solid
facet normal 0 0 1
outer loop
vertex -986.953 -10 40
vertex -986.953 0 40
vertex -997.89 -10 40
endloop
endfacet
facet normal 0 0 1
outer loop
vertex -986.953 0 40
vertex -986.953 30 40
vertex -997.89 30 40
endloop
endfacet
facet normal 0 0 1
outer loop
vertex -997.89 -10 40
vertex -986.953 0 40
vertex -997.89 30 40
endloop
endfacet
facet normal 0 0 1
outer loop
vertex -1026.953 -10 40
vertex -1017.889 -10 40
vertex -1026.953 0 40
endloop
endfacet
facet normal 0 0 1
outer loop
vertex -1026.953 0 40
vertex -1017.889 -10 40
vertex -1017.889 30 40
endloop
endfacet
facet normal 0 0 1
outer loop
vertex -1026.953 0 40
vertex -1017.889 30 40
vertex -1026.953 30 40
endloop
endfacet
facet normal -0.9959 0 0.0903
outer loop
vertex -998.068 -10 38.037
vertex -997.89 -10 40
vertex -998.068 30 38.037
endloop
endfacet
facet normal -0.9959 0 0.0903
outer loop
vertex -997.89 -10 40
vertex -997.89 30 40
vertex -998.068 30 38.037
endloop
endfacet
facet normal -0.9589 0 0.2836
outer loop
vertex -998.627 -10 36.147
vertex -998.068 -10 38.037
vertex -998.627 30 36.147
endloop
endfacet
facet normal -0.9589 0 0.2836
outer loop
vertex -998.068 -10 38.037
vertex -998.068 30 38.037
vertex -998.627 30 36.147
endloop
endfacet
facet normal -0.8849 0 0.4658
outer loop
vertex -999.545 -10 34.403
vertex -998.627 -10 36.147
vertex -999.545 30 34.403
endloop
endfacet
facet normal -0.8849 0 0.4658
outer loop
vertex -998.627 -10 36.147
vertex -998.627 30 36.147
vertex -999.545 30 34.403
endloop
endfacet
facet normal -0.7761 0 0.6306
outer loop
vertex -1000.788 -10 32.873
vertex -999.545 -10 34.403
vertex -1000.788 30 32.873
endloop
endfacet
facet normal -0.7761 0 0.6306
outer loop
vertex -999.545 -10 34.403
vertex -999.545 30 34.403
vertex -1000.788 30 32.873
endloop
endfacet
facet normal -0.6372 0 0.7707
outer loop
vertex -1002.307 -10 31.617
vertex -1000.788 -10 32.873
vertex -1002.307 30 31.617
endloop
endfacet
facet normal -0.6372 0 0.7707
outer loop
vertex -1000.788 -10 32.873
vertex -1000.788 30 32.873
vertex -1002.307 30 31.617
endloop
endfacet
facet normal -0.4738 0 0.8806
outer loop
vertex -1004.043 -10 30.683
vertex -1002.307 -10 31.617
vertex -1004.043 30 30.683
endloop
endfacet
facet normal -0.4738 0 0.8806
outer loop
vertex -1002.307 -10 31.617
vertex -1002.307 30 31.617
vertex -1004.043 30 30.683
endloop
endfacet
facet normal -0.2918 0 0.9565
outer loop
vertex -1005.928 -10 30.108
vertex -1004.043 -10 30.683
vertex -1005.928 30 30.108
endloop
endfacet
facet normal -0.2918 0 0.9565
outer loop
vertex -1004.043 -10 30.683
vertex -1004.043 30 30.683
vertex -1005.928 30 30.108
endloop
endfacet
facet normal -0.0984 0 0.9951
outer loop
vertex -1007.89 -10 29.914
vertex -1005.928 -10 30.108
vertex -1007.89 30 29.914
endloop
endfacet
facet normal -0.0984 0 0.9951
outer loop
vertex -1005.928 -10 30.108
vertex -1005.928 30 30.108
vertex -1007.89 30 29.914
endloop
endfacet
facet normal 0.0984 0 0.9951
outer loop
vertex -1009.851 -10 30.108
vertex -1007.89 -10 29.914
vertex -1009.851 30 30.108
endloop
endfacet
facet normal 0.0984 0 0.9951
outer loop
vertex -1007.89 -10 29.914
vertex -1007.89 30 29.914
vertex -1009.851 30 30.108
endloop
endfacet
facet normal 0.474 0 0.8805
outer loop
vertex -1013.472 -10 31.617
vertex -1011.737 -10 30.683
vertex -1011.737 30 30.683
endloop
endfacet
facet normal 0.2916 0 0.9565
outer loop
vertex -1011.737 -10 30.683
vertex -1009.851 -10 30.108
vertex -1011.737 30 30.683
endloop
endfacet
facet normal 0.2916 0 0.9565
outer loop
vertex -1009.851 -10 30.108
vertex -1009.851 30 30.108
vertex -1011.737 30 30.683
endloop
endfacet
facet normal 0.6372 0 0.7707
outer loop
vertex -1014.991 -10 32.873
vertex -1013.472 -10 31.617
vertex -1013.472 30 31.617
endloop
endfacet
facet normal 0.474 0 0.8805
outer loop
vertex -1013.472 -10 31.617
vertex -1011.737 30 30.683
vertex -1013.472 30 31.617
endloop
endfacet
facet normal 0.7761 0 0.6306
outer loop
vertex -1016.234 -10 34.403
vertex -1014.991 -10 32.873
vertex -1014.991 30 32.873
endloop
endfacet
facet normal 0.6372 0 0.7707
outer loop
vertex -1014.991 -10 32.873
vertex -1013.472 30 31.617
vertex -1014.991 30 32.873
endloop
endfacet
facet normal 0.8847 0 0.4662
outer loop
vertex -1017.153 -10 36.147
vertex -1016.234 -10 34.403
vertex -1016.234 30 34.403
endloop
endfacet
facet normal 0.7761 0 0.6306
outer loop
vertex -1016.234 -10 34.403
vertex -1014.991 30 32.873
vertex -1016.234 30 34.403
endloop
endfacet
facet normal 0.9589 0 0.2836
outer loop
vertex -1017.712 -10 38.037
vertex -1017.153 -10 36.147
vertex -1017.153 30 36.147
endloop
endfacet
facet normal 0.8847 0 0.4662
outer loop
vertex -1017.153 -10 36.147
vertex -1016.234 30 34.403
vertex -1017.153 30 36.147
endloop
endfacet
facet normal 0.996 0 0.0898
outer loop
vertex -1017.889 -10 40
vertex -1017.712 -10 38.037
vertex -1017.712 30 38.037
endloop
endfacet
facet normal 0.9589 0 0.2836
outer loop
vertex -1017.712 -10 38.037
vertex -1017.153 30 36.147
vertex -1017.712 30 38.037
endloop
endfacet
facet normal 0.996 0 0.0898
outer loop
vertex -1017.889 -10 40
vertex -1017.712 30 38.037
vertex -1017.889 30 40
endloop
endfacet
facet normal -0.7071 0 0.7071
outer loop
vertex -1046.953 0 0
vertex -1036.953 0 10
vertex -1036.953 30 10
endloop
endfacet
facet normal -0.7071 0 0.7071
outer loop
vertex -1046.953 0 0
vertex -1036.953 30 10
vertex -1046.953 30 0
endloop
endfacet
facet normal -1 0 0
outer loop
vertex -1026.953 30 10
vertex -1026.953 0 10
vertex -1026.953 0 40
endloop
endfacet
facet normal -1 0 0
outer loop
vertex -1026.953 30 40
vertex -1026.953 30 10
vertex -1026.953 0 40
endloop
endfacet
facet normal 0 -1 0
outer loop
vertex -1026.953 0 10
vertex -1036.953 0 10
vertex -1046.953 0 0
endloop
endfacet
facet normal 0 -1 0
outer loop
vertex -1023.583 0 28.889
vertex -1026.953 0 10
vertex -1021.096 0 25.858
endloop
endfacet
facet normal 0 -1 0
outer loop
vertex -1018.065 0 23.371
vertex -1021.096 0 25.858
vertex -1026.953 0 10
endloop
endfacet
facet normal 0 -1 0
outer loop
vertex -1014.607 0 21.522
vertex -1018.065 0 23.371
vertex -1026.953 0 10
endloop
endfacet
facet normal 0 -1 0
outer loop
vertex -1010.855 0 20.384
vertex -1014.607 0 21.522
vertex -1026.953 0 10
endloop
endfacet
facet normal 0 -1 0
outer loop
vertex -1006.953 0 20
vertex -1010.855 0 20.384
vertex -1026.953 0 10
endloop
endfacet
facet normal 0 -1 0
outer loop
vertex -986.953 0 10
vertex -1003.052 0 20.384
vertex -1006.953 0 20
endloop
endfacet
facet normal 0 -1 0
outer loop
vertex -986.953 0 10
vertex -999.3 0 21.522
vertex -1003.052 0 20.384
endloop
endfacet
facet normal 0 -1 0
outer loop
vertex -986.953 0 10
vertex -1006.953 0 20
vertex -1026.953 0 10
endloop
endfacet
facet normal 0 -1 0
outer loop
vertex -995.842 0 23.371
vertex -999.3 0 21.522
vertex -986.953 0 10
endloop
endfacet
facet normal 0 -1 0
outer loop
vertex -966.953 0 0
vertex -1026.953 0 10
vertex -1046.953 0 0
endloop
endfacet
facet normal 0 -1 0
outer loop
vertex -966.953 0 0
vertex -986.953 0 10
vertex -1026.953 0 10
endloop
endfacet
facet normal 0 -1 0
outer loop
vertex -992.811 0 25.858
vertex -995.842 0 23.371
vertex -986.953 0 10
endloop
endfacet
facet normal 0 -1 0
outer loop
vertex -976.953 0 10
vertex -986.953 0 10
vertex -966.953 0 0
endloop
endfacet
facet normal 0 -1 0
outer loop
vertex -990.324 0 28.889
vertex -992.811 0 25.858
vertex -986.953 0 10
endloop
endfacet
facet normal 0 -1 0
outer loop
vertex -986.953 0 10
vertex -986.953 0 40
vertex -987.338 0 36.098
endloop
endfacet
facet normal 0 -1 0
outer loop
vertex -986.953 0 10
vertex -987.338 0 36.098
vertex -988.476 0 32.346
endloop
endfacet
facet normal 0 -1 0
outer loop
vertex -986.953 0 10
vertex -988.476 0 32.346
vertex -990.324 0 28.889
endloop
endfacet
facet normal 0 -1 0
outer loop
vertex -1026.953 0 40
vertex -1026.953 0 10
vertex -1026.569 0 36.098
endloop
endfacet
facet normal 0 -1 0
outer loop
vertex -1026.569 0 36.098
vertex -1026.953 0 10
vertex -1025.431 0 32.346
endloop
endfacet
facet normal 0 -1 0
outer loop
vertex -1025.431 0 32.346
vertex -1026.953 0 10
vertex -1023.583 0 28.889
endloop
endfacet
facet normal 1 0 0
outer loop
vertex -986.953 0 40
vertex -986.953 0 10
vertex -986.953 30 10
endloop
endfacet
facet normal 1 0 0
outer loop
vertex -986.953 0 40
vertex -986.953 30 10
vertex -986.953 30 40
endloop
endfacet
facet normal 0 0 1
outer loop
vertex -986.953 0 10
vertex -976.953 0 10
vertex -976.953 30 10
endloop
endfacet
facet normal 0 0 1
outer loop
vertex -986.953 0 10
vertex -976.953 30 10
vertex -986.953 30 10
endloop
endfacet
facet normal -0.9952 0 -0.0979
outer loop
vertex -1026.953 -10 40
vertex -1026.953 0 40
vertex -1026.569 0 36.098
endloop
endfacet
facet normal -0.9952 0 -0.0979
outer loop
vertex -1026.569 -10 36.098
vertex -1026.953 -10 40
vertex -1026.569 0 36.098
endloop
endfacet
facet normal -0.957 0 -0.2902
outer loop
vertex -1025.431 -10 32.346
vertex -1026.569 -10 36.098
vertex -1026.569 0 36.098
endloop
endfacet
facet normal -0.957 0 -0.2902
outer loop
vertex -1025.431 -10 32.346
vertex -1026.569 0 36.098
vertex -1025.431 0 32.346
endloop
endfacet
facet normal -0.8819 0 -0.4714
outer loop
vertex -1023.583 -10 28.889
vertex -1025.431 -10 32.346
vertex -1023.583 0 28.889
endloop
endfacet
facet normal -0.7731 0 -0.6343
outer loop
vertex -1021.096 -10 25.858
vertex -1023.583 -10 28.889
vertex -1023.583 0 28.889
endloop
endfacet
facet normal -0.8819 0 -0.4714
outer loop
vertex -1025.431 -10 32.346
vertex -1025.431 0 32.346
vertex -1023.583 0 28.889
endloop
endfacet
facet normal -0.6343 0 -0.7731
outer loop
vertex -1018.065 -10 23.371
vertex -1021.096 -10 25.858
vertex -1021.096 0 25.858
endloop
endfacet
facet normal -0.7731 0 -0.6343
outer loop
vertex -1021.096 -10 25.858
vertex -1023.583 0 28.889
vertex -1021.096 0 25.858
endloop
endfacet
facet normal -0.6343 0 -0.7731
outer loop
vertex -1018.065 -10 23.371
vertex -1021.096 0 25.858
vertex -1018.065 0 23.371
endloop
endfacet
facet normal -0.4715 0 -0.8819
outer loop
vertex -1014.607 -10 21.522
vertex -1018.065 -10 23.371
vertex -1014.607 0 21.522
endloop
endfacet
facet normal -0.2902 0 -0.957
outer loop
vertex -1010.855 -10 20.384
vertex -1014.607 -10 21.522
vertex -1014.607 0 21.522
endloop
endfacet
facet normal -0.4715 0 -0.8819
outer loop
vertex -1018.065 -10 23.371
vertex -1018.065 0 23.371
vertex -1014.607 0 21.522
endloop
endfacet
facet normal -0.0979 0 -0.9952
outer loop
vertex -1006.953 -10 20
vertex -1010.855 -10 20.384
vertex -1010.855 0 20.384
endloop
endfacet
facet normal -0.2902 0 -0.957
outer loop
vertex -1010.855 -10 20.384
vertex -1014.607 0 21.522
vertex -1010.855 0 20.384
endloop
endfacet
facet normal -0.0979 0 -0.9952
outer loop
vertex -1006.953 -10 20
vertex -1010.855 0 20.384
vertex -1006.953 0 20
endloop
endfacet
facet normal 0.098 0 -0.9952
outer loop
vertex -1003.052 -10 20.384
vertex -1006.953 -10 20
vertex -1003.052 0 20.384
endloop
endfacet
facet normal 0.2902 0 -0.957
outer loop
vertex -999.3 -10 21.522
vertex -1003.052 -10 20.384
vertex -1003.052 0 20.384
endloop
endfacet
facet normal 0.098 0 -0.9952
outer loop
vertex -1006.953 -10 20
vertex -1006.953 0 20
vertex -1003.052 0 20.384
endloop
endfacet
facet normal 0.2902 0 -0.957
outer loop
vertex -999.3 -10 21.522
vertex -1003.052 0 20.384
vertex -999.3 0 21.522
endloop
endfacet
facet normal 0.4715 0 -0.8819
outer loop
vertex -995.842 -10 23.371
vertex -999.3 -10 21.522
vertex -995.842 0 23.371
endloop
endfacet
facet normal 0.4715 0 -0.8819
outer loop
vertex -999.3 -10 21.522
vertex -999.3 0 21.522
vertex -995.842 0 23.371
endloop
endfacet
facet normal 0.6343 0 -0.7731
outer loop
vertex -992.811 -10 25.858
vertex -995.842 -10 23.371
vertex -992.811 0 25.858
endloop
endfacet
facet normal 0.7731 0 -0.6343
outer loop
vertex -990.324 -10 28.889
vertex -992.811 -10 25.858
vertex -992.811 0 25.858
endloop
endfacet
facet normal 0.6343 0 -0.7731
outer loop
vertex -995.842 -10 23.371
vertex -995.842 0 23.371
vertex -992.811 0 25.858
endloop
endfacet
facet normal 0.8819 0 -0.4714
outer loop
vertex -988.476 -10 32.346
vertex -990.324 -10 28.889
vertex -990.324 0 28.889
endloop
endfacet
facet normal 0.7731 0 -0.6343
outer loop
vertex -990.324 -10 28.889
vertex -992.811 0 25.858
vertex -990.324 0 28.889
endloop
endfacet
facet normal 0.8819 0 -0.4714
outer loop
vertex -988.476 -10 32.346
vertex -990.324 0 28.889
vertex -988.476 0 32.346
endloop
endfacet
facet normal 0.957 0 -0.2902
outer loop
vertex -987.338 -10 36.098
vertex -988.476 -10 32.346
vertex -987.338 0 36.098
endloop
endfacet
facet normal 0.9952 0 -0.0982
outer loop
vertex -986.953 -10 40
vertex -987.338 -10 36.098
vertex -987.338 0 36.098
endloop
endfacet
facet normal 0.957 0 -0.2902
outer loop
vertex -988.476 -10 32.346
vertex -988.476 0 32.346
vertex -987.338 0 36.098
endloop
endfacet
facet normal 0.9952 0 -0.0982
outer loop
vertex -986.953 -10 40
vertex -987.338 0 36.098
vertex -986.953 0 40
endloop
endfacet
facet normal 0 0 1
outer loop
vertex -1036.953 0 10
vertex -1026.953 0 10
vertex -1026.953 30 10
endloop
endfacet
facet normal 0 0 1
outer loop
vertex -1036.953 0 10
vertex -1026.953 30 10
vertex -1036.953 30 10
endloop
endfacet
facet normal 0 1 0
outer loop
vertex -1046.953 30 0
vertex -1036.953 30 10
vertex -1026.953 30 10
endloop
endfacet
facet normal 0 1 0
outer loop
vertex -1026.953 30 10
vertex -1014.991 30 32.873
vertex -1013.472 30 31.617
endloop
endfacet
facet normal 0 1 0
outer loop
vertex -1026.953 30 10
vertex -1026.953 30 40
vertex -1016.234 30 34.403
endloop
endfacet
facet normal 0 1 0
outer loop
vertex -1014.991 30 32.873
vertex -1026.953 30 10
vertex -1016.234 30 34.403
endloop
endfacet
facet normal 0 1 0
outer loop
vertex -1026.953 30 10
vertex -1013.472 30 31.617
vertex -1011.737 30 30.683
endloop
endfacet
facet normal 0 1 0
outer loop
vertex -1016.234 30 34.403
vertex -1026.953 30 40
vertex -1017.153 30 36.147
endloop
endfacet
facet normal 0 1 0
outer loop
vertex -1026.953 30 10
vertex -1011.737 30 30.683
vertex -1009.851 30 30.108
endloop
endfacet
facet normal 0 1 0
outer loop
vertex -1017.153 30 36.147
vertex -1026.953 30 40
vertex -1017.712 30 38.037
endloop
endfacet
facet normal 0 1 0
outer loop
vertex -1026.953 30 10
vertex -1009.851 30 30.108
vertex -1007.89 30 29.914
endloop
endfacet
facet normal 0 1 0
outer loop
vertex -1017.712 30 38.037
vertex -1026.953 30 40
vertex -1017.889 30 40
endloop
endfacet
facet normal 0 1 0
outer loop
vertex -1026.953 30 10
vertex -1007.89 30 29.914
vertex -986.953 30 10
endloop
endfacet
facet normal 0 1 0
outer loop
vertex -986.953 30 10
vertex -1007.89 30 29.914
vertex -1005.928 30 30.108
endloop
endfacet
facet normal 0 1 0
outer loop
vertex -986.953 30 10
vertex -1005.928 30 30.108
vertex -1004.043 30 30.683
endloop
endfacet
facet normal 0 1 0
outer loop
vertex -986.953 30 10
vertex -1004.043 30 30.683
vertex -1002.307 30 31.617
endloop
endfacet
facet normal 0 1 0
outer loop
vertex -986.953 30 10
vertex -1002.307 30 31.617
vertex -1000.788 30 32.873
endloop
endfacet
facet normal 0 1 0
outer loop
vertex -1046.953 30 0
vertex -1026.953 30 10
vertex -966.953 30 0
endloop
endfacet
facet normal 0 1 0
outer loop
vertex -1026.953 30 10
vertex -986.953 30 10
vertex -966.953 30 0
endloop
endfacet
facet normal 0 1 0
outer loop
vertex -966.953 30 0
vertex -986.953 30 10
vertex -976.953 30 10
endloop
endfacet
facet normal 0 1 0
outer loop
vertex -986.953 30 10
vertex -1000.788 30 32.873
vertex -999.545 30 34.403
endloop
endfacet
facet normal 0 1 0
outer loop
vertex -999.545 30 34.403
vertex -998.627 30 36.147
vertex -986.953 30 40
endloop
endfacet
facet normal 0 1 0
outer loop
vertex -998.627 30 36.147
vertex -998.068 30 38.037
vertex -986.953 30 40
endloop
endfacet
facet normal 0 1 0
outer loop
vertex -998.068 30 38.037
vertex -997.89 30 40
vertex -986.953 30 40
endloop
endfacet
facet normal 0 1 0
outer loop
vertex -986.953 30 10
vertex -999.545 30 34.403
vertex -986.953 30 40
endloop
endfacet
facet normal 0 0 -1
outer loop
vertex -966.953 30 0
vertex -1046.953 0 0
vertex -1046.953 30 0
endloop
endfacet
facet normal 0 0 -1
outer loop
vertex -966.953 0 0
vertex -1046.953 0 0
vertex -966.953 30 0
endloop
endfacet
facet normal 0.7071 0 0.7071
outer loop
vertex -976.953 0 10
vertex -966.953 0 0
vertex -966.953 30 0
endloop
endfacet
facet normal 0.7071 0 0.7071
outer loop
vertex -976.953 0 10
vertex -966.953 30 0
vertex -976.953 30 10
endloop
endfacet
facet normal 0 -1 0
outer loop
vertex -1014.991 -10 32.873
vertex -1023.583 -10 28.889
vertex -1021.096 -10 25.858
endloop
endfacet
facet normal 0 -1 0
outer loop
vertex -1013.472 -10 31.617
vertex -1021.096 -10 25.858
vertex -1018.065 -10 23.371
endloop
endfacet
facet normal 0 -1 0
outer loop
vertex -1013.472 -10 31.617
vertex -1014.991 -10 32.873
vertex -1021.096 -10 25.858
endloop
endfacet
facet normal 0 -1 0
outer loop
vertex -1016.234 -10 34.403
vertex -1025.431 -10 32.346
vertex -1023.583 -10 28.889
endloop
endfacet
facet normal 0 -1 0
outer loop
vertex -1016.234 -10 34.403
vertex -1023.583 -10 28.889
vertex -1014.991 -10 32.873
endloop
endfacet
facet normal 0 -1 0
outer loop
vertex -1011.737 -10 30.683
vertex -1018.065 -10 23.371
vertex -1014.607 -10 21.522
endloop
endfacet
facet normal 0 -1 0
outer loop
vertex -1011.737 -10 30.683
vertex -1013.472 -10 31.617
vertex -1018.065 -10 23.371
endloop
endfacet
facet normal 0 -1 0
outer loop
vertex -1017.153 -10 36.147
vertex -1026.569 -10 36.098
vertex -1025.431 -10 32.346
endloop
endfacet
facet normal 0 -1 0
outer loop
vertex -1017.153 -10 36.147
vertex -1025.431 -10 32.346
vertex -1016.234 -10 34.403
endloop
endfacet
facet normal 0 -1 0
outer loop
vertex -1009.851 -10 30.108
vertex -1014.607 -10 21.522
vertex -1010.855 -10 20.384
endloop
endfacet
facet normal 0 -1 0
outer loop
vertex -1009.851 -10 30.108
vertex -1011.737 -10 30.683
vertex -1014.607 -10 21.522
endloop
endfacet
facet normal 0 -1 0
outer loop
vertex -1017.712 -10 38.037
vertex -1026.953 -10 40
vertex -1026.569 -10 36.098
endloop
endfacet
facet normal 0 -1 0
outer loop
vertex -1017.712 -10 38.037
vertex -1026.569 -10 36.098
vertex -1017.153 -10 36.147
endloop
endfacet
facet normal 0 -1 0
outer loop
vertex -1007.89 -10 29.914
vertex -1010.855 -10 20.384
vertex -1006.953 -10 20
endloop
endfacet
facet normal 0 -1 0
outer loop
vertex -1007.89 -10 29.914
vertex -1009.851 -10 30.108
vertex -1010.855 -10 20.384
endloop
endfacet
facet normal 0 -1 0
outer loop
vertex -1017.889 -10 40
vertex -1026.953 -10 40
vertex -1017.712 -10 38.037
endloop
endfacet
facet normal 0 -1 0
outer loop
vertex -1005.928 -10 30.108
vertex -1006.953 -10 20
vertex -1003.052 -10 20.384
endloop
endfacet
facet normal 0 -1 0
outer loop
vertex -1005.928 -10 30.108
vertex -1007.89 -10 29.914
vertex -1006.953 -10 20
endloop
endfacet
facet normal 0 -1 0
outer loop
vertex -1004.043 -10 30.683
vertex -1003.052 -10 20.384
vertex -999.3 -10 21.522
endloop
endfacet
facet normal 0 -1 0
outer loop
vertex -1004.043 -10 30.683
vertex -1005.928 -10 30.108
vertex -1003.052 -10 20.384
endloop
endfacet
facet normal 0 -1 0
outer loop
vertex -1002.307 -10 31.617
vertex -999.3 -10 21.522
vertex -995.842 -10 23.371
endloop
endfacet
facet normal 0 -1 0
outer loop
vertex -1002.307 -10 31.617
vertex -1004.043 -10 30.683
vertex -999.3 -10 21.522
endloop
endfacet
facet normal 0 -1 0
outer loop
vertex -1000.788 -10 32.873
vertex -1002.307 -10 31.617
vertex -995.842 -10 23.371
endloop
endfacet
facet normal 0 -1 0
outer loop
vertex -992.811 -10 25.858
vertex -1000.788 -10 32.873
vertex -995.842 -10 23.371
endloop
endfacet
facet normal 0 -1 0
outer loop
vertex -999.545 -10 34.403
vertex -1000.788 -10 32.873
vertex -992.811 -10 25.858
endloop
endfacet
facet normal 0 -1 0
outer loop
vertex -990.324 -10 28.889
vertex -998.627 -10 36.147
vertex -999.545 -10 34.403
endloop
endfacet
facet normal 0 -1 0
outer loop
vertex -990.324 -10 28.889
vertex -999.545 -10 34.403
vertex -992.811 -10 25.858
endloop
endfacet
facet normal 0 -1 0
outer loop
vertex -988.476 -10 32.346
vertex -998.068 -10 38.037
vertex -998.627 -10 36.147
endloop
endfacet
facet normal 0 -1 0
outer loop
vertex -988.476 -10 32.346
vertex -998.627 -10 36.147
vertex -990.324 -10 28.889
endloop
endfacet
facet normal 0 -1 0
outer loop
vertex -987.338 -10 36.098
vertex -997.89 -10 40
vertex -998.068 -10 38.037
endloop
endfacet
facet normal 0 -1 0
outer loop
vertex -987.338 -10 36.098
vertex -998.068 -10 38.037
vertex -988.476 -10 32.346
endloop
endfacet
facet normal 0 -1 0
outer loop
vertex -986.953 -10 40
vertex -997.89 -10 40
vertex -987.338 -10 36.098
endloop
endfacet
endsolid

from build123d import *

# Parameters (mm, degrees)
F1_DEPTH = 30
F2_W     = 40
F2_H     = 30
F3_DEPTH = 30
F5_DEPTH = 10
F7_D     = 20


with BuildPart() as f1:
    # F0 (on Front) → F1 (new body)
    with BuildSketch(Plane.XZ):
        Polygon((-1036.953415, 10), (-1046.953415, 0), (-966.953415, 0), (-976.953415, 10), align=None)
    extrude(amount=-F1_DEPTH)

    # F2 (on face) → F3 (join)
    with BuildSketch(Plane.XZ):
        with Locations((-1006.953415, 25)):
            Rectangle(F2_W, F2_H)
    extrude(amount=-F3_DEPTH)

    # F4 (on face) → F5 (join)
    with BuildSketch(Plane.XZ):
        with BuildLine():
            Line((-986.953415, 40), (-1026.953415, 40))
            ThreePointArc((-1026.953415, 40), (-1006.953415, 20), (-986.953415, 40))
        make_face()
    extrude(amount=F5_DEPTH)

    # F7 (through all)
    with Locations(Plane.XZ.offset(10)):
        with Locations((-1007.889872, 39.913703)):
            Hole(F7_D / 2)


solid = f1.part
